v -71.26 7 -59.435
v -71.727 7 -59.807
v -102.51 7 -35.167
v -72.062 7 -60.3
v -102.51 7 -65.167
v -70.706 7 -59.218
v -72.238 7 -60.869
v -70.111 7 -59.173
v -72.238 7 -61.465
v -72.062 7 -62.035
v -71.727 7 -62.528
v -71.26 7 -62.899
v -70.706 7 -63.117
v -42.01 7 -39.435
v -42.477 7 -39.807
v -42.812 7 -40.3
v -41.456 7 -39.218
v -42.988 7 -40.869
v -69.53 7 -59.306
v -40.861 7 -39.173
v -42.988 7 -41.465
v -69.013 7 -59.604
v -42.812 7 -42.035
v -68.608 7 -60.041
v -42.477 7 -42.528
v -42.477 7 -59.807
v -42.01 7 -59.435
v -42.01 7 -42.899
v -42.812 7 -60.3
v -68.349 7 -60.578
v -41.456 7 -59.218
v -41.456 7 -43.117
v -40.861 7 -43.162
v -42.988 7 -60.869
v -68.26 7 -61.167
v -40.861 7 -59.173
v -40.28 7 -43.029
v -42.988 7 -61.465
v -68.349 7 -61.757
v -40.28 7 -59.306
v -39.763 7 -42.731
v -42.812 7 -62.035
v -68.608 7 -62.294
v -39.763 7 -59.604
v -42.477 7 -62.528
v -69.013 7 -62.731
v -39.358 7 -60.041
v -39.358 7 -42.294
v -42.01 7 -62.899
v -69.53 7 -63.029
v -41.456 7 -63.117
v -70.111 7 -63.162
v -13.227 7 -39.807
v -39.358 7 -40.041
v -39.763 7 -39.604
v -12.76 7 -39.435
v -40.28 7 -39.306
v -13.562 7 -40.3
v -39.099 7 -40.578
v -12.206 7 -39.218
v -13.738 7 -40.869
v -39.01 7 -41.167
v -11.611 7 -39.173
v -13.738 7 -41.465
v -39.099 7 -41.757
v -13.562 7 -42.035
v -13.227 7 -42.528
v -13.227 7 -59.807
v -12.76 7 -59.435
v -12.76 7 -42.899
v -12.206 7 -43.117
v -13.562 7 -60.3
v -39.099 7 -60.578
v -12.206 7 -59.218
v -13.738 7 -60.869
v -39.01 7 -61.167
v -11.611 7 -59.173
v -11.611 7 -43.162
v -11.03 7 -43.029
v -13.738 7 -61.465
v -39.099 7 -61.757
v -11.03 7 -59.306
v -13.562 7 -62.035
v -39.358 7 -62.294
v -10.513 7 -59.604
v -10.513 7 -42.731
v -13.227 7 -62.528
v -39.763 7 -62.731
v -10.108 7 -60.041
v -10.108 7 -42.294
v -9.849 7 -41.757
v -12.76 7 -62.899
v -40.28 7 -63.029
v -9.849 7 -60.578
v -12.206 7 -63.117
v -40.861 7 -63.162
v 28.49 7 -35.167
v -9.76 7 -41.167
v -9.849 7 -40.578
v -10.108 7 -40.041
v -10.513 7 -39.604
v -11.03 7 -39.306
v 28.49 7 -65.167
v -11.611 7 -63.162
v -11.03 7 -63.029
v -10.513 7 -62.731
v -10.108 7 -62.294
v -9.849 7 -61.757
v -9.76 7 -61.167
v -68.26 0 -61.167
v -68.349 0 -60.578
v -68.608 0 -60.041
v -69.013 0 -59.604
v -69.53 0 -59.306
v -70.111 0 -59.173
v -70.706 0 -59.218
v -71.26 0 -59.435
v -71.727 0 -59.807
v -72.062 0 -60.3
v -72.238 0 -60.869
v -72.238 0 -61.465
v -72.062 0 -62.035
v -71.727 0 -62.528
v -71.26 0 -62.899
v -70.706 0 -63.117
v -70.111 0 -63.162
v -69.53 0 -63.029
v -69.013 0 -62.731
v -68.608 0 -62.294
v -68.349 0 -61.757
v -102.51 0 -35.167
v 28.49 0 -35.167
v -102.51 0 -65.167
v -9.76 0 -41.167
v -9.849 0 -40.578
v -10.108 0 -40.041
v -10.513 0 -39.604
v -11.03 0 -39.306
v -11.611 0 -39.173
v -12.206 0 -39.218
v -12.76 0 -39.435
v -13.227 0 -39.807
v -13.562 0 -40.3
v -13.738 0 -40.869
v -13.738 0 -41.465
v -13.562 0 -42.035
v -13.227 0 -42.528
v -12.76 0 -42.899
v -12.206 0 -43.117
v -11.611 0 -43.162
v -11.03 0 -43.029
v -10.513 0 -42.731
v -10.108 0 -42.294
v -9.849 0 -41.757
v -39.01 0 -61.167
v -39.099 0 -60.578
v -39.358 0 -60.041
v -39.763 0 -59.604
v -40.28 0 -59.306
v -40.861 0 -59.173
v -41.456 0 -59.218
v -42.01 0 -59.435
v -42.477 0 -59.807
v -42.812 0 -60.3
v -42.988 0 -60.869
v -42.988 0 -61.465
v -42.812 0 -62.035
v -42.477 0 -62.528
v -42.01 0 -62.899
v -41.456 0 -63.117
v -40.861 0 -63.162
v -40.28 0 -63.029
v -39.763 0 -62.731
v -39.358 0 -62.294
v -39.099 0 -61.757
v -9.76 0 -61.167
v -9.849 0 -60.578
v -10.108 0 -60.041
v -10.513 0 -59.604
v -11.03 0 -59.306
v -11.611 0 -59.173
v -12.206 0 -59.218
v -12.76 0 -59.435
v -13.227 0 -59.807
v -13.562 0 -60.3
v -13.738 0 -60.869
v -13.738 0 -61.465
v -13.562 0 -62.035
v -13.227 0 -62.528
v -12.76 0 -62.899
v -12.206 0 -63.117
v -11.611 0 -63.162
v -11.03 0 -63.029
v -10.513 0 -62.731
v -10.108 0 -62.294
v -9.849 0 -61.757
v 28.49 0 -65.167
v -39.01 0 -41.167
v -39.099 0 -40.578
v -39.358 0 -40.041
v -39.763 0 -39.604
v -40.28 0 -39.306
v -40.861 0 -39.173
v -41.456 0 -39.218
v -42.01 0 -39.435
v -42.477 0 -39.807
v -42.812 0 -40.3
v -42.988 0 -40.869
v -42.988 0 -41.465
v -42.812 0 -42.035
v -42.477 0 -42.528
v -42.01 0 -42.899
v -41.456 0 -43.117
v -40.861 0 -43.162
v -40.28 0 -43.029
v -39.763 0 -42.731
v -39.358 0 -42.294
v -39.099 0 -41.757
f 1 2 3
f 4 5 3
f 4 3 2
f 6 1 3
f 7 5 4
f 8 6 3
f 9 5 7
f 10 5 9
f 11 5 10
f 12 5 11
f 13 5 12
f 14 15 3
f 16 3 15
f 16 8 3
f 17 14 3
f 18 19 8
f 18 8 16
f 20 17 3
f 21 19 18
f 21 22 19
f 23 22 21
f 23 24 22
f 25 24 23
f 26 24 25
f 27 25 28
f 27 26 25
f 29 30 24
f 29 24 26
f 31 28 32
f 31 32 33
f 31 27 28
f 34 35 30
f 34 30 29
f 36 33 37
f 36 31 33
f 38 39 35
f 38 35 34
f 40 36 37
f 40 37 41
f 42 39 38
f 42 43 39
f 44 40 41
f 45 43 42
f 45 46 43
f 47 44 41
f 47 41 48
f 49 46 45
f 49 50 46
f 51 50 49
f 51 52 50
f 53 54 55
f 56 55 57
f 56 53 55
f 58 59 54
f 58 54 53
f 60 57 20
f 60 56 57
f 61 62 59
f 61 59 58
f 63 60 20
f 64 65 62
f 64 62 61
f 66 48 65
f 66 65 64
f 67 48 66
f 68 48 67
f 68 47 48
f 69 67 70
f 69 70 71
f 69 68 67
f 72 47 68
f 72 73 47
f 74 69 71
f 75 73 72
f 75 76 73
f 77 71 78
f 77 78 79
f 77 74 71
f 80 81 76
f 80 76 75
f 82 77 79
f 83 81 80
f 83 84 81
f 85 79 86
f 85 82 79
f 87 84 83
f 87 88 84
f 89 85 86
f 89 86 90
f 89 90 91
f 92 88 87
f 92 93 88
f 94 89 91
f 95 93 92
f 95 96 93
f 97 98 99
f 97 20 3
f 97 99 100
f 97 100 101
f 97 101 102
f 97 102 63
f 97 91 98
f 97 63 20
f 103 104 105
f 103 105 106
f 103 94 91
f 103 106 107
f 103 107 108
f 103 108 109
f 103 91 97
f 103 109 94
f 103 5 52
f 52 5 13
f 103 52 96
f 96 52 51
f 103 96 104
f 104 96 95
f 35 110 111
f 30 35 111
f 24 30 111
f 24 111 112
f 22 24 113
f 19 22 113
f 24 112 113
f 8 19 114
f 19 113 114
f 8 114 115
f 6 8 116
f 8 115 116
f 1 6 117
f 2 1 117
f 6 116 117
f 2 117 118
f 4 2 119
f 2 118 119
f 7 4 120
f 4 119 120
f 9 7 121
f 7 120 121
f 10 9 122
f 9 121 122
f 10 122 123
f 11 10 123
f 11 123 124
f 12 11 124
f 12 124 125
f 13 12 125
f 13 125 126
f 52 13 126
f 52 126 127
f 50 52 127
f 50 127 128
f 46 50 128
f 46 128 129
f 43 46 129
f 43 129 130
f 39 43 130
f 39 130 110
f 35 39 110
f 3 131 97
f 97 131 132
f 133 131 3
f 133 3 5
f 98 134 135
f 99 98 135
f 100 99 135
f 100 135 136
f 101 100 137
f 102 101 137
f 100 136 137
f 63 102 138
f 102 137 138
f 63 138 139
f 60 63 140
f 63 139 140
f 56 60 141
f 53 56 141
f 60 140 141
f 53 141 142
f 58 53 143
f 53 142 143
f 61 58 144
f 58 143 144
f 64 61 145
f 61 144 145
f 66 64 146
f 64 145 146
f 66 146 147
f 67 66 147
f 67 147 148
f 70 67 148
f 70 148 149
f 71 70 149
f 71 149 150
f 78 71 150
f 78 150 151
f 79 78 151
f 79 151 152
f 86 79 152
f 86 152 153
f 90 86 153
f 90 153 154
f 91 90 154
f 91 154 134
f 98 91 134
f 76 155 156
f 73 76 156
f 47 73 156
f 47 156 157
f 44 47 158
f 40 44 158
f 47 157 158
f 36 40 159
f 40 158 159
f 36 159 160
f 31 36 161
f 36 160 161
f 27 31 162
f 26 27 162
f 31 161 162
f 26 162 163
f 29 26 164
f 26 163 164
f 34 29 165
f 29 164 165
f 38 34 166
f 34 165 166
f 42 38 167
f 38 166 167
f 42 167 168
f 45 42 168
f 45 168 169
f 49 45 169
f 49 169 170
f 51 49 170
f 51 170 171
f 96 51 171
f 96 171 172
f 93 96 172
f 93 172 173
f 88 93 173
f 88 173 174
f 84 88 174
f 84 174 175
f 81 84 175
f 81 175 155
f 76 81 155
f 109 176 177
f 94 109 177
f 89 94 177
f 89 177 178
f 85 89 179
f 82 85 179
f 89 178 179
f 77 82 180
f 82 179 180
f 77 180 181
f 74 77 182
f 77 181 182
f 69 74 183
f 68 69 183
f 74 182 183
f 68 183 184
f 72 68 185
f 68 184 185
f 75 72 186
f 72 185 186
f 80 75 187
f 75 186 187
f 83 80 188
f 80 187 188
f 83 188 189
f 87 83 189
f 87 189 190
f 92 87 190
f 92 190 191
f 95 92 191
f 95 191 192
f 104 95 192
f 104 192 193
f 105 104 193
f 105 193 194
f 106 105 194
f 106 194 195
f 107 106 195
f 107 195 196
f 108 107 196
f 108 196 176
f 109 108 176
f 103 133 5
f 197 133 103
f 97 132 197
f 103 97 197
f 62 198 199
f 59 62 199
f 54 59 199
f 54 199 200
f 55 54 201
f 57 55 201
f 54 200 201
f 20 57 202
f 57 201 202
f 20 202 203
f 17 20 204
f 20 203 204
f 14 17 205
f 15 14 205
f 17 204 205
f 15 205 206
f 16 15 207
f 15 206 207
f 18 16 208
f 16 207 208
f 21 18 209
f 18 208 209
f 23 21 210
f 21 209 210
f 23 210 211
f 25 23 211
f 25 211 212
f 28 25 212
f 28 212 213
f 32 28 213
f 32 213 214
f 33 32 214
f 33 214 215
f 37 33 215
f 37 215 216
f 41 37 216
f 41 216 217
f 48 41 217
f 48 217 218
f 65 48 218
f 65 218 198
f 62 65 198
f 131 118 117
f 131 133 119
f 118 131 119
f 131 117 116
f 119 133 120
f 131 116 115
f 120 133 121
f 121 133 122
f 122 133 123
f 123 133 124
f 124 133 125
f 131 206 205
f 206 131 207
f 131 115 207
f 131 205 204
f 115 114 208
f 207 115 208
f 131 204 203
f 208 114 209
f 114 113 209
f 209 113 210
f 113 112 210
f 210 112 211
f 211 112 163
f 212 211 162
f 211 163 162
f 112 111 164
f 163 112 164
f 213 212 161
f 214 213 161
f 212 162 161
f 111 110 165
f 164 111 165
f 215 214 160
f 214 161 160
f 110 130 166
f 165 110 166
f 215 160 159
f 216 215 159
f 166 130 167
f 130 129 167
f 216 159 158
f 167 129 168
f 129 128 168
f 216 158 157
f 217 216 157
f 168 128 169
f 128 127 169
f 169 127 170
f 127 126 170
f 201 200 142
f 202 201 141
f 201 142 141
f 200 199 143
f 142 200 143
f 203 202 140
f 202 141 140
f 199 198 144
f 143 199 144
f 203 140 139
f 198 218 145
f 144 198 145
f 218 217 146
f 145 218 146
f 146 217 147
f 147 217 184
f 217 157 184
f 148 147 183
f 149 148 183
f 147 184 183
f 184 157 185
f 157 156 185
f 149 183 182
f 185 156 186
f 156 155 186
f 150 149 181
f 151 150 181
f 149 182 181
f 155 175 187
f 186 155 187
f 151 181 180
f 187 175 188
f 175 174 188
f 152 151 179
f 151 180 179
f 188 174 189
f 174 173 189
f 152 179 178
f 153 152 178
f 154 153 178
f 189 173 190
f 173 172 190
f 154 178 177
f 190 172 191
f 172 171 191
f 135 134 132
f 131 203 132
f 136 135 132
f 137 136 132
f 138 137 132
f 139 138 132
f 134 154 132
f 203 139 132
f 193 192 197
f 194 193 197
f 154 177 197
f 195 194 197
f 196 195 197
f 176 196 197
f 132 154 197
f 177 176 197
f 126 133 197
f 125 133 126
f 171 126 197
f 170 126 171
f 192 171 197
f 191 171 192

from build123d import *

# Parameters (mm, degrees)
SKETCH1_W           = 131
SKETCH1_H           = 30
BOSS_EXTRUDE1_DEPTH = 7
SKETCH2_R           = 2
CUT_EXTRUDE1_DEPTH  = 10


with BuildPart() as part:
    # Sketch1 → Boss-Extrude1 (new body)
    with BuildSketch(Plane(origin=(0, 0, 0), x_dir=(1, 0, 0), z_dir=(0, 1, 0))):
        with Locations((-37.010460251, 50.167364017)):
            Rectangle(SKETCH1_W, SKETCH1_H)
    extrude(amount=BOSS_EXTRUDE1_DEPTH)

    # Sketch2 → Cut-Extrude1 (cut)
    with BuildSketch(Plane.XZ):
        with Locations((-70.260460251, -61.167364017)):
            Circle(SKETCH2_R)
        with Locations((-41.010460251, -61.167364017)):
            Circle(SKETCH2_R)
        with Locations((-11.760460251, -61.167364017)):
            Circle(SKETCH2_R)
        with Locations((-11.760460251, -41.167364017)):
            Circle(SKETCH2_R)
        with Locations((-41.010460251, -41.167364017)):
            Circle(SKETCH2_R)
    extrude(amount=-CUT_EXTRUDE1_DEPTH, mode=Mode.SUBTRACT)


solid = part.part
